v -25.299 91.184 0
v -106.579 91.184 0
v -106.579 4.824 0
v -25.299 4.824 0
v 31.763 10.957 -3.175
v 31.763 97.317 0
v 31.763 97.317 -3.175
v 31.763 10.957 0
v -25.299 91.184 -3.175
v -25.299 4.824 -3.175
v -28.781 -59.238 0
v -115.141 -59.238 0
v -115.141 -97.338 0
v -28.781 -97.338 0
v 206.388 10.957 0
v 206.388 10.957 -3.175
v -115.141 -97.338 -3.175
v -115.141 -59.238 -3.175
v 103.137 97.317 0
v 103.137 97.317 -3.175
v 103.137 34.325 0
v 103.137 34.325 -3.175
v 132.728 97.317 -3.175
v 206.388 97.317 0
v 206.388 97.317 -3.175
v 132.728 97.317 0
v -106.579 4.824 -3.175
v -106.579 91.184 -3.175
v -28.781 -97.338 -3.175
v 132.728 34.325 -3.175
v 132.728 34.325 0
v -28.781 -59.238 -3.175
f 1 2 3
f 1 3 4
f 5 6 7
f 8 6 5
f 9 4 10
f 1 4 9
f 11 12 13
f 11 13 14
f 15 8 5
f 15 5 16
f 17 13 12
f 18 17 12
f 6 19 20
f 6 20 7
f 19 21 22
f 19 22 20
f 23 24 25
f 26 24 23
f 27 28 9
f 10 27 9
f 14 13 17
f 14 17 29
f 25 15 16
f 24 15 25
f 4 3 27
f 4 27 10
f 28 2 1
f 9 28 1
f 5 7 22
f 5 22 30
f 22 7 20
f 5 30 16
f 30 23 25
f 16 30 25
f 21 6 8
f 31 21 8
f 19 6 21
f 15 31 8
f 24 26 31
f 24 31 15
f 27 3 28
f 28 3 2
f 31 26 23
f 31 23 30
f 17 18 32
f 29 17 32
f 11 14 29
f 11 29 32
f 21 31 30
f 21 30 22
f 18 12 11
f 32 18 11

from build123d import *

# Parameters (mm, degrees)
F0_W     = 81.28
F0_H     = 86.36
F1_DEPTH = 3.175
F2_W     = 86.36
F2_H     = 38.1
F3_DEPTH = 3.175
F5_DEPTH = 3.175


with BuildPart() as f1:
    # F0 (on Top) → F1 (new body)
    with BuildSketch(Plane.XY):
        with Locations((-65.938699, 48.003859)):
            Rectangle(F0_W, F0_H)
    extrude(amount=-F1_DEPTH)


with BuildPart() as f3:
    # F2 (on Top) → F3 (new body)
    with BuildSketch(Plane.XY):
        with Locations((-71.960979, -78.288232)):
            Rectangle(F2_W, F2_H)
    extrude(amount=-F3_DEPTH)


with BuildPart() as f5:
    # F4 (on Top) → F5 (new body)
    with BuildSketch(Plane.XY):
        Polygon((103.136617, 97.316596), (31.762617, 97.316596), (31.762617, 10.956596), (206.387617, 10.956596), (206.387617, 97.316596), (132.727617, 97.316596), (132.727617, 34.324596), (103.136617, 34.324596), align=None)
    extrude(amount=-F5_DEPTH)


solid = Compound([f1.part, f3.part, f5.part])
